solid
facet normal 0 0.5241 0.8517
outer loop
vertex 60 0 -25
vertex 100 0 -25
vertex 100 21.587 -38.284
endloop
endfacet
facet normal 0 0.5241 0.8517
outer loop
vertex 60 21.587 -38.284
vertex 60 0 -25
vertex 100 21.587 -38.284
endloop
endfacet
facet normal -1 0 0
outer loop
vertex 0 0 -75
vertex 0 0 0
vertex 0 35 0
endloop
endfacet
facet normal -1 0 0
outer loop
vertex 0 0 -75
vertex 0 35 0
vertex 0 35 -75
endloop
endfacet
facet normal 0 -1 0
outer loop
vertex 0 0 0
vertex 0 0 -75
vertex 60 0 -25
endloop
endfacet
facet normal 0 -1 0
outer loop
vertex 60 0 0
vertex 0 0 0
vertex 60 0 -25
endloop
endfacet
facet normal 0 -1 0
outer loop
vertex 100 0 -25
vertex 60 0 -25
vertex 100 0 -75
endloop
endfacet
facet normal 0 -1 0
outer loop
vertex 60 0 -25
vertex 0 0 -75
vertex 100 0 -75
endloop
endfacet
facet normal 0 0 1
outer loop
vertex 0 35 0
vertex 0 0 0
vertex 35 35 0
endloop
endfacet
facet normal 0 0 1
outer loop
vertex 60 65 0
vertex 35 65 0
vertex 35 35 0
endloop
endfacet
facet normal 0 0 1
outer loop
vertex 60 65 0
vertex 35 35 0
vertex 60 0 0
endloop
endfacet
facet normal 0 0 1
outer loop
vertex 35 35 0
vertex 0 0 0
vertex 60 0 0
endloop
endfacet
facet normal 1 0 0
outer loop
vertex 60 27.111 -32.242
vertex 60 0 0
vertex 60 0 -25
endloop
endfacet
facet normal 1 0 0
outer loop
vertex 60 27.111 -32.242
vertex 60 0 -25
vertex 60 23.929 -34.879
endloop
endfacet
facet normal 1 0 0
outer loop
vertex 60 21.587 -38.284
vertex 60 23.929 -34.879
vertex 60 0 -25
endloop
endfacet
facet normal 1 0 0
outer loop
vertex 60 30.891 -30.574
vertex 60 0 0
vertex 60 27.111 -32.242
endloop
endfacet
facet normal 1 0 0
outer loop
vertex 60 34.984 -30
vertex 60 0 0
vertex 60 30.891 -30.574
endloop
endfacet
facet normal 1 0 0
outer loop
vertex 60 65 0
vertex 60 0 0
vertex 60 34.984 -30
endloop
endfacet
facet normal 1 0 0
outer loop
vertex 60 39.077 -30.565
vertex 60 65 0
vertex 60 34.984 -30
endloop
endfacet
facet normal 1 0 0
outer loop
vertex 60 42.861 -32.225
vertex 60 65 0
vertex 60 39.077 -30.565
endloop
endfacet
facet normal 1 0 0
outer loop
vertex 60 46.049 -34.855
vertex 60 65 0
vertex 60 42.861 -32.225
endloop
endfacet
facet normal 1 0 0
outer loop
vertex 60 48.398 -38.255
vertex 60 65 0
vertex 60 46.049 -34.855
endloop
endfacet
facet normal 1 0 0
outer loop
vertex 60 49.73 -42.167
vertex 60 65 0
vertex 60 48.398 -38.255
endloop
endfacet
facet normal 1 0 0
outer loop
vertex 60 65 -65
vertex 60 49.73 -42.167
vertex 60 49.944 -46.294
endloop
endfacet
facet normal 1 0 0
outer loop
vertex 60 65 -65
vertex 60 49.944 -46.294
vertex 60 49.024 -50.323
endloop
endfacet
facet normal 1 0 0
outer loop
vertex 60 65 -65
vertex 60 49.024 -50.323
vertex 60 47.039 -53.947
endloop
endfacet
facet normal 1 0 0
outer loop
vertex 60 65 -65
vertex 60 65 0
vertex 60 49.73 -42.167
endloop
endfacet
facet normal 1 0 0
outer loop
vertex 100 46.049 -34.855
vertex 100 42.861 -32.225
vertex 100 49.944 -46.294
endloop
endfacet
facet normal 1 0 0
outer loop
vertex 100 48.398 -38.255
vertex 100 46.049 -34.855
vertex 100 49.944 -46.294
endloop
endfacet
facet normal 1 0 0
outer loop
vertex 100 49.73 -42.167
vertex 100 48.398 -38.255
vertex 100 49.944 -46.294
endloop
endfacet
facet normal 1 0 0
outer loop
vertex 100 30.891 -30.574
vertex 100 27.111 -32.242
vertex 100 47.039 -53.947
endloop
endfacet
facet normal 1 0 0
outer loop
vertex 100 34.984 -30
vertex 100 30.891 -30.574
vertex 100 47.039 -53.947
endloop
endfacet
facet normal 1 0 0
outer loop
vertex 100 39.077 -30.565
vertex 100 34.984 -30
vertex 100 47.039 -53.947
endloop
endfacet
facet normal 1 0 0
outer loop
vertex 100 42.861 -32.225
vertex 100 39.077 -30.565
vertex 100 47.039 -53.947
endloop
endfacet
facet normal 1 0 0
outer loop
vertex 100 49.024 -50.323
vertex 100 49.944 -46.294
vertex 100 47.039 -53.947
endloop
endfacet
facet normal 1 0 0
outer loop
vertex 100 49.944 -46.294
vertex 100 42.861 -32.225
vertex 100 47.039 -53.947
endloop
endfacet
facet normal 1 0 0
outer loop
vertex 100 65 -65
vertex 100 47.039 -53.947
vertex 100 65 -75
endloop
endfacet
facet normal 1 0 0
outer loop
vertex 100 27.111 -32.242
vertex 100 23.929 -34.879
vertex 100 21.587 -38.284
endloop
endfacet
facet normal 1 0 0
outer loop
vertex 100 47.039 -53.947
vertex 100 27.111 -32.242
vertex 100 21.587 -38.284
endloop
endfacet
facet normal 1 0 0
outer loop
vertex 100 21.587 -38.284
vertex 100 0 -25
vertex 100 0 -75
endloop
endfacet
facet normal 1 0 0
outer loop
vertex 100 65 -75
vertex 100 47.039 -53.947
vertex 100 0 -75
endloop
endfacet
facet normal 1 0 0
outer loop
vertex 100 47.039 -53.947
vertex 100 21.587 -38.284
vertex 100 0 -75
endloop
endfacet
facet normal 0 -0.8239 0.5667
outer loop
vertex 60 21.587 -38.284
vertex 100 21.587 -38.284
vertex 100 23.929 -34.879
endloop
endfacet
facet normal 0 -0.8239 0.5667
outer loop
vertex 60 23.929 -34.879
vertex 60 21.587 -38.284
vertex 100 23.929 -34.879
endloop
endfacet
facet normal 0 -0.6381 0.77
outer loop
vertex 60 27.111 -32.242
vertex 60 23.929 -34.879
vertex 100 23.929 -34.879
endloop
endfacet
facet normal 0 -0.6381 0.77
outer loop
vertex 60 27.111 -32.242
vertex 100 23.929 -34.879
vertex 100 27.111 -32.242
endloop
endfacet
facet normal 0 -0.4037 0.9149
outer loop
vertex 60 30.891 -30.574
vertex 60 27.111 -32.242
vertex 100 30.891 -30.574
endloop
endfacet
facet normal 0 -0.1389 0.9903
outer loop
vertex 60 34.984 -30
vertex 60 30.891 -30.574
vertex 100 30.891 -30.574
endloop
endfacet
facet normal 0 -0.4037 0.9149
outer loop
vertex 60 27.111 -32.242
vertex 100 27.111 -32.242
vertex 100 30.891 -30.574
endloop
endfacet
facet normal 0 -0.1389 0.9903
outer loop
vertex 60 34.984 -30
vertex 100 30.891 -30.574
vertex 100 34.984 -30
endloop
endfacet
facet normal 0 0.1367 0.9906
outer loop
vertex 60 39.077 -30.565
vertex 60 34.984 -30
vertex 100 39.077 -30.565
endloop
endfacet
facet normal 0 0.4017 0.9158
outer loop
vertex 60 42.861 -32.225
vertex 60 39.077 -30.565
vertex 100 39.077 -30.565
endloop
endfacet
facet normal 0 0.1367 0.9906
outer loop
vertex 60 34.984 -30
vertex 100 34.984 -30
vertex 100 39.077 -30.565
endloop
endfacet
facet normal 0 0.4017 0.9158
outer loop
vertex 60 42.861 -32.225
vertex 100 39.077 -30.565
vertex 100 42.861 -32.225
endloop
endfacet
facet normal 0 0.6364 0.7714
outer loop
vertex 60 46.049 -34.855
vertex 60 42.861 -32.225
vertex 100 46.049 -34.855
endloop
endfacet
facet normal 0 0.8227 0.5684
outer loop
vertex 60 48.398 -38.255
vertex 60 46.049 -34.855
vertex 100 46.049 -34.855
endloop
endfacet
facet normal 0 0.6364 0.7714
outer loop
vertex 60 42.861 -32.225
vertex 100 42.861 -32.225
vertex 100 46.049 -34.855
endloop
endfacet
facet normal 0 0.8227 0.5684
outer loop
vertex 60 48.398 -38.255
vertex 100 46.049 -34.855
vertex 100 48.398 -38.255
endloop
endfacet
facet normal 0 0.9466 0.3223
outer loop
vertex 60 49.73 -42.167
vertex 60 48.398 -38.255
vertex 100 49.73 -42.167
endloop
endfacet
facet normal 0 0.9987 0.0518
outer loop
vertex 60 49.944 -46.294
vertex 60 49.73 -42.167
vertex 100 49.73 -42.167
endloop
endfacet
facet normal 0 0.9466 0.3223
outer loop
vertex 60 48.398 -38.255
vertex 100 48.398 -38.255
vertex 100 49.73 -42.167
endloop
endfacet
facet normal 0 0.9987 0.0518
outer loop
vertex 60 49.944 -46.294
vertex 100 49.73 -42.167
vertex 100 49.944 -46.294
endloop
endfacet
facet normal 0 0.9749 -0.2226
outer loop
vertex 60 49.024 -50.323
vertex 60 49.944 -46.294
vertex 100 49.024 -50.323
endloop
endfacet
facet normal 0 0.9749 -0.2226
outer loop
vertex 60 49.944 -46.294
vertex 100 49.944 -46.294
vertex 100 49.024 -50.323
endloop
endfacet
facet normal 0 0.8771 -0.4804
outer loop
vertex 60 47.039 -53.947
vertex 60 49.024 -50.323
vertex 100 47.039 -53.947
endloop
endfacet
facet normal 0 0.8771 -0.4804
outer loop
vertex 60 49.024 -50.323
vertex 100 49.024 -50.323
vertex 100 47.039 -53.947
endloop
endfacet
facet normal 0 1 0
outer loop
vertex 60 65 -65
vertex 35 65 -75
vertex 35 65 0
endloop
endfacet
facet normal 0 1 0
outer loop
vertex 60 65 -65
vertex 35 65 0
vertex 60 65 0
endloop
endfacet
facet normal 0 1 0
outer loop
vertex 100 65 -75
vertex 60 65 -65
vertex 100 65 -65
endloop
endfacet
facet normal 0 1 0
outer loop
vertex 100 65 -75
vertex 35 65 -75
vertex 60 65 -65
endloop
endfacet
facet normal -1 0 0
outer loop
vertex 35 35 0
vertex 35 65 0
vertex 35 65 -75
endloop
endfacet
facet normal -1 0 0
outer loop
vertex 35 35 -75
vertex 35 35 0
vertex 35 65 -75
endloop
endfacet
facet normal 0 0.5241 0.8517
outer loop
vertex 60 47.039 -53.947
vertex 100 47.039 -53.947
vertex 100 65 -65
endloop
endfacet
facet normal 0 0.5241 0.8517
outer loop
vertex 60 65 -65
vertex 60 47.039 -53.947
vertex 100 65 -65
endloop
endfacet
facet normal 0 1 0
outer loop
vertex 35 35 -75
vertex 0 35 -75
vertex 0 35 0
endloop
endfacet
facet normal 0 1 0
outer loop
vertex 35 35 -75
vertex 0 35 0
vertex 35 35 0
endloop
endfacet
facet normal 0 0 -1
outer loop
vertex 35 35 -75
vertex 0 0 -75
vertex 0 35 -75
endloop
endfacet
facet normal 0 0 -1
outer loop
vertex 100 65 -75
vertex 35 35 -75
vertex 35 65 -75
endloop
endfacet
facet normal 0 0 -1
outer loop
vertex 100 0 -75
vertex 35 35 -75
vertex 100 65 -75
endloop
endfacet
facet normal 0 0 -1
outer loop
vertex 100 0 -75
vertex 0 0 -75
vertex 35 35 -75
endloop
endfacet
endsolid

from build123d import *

# Parameters (mm, degrees)
SKETCH1_W           = 100
SKETCH1_H           = 75
BOSS_EXTRUDE1_DEPTH = 65
SKETCH2_W           = 35
SKETCH2_H           = 75
CUT_EXTRUDE1_DEPTH  = 30
CUT_EXTRUDE2_DEPTH  = 40


with BuildPart() as part:
    # Sketch1 → Boss-Extrude1 (new body)
    with BuildSketch(Plane(origin=(0, 0, 0), x_dir=(1, 0, 0), z_dir=(0, 1, 0))):
        with Locations((50, 37.5)):
            Rectangle(SKETCH1_W, SKETCH1_H)
    extrude(amount=BOSS_EXTRUDE1_DEPTH)

    # Sketch2 → Cut-Extrude1 (cut)
    with BuildSketch(Plane(origin=(0, 65, 0), x_dir=(1, 0, 0), z_dir=(0, 1, 0))):
        with Locations((17.5, 37.5)):
            Rectangle(SKETCH2_W, SKETCH2_H)
    extrude(amount=-CUT_EXTRUDE1_DEPTH, mode=Mode.SUBTRACT)

    # Sketch3 → Cut-Extrude2 (cut)
    with BuildSketch(Plane(origin=(100, 0, 0), x_dir=(0, 0, -1), z_dir=(1, 0, 0))):
        with BuildLine():
            Line((25, 0), (38.28446714, 21.587259102))
            ThreePointArc((38.28446714, 21.587259102), (32.225125249, 42.861461385), (53.947292517, 47.03935034))
            Line((53.947292517, 47.03935034), (65, 65))
            Line((65, 65), (0, 65))
            Line((0, 65), (0, 0))
            Line((0, 0), (25, 0))
        make_face()
    extrude(amount=-CUT_EXTRUDE2_DEPTH, mode=Mode.SUBTRACT)


solid = part.part
